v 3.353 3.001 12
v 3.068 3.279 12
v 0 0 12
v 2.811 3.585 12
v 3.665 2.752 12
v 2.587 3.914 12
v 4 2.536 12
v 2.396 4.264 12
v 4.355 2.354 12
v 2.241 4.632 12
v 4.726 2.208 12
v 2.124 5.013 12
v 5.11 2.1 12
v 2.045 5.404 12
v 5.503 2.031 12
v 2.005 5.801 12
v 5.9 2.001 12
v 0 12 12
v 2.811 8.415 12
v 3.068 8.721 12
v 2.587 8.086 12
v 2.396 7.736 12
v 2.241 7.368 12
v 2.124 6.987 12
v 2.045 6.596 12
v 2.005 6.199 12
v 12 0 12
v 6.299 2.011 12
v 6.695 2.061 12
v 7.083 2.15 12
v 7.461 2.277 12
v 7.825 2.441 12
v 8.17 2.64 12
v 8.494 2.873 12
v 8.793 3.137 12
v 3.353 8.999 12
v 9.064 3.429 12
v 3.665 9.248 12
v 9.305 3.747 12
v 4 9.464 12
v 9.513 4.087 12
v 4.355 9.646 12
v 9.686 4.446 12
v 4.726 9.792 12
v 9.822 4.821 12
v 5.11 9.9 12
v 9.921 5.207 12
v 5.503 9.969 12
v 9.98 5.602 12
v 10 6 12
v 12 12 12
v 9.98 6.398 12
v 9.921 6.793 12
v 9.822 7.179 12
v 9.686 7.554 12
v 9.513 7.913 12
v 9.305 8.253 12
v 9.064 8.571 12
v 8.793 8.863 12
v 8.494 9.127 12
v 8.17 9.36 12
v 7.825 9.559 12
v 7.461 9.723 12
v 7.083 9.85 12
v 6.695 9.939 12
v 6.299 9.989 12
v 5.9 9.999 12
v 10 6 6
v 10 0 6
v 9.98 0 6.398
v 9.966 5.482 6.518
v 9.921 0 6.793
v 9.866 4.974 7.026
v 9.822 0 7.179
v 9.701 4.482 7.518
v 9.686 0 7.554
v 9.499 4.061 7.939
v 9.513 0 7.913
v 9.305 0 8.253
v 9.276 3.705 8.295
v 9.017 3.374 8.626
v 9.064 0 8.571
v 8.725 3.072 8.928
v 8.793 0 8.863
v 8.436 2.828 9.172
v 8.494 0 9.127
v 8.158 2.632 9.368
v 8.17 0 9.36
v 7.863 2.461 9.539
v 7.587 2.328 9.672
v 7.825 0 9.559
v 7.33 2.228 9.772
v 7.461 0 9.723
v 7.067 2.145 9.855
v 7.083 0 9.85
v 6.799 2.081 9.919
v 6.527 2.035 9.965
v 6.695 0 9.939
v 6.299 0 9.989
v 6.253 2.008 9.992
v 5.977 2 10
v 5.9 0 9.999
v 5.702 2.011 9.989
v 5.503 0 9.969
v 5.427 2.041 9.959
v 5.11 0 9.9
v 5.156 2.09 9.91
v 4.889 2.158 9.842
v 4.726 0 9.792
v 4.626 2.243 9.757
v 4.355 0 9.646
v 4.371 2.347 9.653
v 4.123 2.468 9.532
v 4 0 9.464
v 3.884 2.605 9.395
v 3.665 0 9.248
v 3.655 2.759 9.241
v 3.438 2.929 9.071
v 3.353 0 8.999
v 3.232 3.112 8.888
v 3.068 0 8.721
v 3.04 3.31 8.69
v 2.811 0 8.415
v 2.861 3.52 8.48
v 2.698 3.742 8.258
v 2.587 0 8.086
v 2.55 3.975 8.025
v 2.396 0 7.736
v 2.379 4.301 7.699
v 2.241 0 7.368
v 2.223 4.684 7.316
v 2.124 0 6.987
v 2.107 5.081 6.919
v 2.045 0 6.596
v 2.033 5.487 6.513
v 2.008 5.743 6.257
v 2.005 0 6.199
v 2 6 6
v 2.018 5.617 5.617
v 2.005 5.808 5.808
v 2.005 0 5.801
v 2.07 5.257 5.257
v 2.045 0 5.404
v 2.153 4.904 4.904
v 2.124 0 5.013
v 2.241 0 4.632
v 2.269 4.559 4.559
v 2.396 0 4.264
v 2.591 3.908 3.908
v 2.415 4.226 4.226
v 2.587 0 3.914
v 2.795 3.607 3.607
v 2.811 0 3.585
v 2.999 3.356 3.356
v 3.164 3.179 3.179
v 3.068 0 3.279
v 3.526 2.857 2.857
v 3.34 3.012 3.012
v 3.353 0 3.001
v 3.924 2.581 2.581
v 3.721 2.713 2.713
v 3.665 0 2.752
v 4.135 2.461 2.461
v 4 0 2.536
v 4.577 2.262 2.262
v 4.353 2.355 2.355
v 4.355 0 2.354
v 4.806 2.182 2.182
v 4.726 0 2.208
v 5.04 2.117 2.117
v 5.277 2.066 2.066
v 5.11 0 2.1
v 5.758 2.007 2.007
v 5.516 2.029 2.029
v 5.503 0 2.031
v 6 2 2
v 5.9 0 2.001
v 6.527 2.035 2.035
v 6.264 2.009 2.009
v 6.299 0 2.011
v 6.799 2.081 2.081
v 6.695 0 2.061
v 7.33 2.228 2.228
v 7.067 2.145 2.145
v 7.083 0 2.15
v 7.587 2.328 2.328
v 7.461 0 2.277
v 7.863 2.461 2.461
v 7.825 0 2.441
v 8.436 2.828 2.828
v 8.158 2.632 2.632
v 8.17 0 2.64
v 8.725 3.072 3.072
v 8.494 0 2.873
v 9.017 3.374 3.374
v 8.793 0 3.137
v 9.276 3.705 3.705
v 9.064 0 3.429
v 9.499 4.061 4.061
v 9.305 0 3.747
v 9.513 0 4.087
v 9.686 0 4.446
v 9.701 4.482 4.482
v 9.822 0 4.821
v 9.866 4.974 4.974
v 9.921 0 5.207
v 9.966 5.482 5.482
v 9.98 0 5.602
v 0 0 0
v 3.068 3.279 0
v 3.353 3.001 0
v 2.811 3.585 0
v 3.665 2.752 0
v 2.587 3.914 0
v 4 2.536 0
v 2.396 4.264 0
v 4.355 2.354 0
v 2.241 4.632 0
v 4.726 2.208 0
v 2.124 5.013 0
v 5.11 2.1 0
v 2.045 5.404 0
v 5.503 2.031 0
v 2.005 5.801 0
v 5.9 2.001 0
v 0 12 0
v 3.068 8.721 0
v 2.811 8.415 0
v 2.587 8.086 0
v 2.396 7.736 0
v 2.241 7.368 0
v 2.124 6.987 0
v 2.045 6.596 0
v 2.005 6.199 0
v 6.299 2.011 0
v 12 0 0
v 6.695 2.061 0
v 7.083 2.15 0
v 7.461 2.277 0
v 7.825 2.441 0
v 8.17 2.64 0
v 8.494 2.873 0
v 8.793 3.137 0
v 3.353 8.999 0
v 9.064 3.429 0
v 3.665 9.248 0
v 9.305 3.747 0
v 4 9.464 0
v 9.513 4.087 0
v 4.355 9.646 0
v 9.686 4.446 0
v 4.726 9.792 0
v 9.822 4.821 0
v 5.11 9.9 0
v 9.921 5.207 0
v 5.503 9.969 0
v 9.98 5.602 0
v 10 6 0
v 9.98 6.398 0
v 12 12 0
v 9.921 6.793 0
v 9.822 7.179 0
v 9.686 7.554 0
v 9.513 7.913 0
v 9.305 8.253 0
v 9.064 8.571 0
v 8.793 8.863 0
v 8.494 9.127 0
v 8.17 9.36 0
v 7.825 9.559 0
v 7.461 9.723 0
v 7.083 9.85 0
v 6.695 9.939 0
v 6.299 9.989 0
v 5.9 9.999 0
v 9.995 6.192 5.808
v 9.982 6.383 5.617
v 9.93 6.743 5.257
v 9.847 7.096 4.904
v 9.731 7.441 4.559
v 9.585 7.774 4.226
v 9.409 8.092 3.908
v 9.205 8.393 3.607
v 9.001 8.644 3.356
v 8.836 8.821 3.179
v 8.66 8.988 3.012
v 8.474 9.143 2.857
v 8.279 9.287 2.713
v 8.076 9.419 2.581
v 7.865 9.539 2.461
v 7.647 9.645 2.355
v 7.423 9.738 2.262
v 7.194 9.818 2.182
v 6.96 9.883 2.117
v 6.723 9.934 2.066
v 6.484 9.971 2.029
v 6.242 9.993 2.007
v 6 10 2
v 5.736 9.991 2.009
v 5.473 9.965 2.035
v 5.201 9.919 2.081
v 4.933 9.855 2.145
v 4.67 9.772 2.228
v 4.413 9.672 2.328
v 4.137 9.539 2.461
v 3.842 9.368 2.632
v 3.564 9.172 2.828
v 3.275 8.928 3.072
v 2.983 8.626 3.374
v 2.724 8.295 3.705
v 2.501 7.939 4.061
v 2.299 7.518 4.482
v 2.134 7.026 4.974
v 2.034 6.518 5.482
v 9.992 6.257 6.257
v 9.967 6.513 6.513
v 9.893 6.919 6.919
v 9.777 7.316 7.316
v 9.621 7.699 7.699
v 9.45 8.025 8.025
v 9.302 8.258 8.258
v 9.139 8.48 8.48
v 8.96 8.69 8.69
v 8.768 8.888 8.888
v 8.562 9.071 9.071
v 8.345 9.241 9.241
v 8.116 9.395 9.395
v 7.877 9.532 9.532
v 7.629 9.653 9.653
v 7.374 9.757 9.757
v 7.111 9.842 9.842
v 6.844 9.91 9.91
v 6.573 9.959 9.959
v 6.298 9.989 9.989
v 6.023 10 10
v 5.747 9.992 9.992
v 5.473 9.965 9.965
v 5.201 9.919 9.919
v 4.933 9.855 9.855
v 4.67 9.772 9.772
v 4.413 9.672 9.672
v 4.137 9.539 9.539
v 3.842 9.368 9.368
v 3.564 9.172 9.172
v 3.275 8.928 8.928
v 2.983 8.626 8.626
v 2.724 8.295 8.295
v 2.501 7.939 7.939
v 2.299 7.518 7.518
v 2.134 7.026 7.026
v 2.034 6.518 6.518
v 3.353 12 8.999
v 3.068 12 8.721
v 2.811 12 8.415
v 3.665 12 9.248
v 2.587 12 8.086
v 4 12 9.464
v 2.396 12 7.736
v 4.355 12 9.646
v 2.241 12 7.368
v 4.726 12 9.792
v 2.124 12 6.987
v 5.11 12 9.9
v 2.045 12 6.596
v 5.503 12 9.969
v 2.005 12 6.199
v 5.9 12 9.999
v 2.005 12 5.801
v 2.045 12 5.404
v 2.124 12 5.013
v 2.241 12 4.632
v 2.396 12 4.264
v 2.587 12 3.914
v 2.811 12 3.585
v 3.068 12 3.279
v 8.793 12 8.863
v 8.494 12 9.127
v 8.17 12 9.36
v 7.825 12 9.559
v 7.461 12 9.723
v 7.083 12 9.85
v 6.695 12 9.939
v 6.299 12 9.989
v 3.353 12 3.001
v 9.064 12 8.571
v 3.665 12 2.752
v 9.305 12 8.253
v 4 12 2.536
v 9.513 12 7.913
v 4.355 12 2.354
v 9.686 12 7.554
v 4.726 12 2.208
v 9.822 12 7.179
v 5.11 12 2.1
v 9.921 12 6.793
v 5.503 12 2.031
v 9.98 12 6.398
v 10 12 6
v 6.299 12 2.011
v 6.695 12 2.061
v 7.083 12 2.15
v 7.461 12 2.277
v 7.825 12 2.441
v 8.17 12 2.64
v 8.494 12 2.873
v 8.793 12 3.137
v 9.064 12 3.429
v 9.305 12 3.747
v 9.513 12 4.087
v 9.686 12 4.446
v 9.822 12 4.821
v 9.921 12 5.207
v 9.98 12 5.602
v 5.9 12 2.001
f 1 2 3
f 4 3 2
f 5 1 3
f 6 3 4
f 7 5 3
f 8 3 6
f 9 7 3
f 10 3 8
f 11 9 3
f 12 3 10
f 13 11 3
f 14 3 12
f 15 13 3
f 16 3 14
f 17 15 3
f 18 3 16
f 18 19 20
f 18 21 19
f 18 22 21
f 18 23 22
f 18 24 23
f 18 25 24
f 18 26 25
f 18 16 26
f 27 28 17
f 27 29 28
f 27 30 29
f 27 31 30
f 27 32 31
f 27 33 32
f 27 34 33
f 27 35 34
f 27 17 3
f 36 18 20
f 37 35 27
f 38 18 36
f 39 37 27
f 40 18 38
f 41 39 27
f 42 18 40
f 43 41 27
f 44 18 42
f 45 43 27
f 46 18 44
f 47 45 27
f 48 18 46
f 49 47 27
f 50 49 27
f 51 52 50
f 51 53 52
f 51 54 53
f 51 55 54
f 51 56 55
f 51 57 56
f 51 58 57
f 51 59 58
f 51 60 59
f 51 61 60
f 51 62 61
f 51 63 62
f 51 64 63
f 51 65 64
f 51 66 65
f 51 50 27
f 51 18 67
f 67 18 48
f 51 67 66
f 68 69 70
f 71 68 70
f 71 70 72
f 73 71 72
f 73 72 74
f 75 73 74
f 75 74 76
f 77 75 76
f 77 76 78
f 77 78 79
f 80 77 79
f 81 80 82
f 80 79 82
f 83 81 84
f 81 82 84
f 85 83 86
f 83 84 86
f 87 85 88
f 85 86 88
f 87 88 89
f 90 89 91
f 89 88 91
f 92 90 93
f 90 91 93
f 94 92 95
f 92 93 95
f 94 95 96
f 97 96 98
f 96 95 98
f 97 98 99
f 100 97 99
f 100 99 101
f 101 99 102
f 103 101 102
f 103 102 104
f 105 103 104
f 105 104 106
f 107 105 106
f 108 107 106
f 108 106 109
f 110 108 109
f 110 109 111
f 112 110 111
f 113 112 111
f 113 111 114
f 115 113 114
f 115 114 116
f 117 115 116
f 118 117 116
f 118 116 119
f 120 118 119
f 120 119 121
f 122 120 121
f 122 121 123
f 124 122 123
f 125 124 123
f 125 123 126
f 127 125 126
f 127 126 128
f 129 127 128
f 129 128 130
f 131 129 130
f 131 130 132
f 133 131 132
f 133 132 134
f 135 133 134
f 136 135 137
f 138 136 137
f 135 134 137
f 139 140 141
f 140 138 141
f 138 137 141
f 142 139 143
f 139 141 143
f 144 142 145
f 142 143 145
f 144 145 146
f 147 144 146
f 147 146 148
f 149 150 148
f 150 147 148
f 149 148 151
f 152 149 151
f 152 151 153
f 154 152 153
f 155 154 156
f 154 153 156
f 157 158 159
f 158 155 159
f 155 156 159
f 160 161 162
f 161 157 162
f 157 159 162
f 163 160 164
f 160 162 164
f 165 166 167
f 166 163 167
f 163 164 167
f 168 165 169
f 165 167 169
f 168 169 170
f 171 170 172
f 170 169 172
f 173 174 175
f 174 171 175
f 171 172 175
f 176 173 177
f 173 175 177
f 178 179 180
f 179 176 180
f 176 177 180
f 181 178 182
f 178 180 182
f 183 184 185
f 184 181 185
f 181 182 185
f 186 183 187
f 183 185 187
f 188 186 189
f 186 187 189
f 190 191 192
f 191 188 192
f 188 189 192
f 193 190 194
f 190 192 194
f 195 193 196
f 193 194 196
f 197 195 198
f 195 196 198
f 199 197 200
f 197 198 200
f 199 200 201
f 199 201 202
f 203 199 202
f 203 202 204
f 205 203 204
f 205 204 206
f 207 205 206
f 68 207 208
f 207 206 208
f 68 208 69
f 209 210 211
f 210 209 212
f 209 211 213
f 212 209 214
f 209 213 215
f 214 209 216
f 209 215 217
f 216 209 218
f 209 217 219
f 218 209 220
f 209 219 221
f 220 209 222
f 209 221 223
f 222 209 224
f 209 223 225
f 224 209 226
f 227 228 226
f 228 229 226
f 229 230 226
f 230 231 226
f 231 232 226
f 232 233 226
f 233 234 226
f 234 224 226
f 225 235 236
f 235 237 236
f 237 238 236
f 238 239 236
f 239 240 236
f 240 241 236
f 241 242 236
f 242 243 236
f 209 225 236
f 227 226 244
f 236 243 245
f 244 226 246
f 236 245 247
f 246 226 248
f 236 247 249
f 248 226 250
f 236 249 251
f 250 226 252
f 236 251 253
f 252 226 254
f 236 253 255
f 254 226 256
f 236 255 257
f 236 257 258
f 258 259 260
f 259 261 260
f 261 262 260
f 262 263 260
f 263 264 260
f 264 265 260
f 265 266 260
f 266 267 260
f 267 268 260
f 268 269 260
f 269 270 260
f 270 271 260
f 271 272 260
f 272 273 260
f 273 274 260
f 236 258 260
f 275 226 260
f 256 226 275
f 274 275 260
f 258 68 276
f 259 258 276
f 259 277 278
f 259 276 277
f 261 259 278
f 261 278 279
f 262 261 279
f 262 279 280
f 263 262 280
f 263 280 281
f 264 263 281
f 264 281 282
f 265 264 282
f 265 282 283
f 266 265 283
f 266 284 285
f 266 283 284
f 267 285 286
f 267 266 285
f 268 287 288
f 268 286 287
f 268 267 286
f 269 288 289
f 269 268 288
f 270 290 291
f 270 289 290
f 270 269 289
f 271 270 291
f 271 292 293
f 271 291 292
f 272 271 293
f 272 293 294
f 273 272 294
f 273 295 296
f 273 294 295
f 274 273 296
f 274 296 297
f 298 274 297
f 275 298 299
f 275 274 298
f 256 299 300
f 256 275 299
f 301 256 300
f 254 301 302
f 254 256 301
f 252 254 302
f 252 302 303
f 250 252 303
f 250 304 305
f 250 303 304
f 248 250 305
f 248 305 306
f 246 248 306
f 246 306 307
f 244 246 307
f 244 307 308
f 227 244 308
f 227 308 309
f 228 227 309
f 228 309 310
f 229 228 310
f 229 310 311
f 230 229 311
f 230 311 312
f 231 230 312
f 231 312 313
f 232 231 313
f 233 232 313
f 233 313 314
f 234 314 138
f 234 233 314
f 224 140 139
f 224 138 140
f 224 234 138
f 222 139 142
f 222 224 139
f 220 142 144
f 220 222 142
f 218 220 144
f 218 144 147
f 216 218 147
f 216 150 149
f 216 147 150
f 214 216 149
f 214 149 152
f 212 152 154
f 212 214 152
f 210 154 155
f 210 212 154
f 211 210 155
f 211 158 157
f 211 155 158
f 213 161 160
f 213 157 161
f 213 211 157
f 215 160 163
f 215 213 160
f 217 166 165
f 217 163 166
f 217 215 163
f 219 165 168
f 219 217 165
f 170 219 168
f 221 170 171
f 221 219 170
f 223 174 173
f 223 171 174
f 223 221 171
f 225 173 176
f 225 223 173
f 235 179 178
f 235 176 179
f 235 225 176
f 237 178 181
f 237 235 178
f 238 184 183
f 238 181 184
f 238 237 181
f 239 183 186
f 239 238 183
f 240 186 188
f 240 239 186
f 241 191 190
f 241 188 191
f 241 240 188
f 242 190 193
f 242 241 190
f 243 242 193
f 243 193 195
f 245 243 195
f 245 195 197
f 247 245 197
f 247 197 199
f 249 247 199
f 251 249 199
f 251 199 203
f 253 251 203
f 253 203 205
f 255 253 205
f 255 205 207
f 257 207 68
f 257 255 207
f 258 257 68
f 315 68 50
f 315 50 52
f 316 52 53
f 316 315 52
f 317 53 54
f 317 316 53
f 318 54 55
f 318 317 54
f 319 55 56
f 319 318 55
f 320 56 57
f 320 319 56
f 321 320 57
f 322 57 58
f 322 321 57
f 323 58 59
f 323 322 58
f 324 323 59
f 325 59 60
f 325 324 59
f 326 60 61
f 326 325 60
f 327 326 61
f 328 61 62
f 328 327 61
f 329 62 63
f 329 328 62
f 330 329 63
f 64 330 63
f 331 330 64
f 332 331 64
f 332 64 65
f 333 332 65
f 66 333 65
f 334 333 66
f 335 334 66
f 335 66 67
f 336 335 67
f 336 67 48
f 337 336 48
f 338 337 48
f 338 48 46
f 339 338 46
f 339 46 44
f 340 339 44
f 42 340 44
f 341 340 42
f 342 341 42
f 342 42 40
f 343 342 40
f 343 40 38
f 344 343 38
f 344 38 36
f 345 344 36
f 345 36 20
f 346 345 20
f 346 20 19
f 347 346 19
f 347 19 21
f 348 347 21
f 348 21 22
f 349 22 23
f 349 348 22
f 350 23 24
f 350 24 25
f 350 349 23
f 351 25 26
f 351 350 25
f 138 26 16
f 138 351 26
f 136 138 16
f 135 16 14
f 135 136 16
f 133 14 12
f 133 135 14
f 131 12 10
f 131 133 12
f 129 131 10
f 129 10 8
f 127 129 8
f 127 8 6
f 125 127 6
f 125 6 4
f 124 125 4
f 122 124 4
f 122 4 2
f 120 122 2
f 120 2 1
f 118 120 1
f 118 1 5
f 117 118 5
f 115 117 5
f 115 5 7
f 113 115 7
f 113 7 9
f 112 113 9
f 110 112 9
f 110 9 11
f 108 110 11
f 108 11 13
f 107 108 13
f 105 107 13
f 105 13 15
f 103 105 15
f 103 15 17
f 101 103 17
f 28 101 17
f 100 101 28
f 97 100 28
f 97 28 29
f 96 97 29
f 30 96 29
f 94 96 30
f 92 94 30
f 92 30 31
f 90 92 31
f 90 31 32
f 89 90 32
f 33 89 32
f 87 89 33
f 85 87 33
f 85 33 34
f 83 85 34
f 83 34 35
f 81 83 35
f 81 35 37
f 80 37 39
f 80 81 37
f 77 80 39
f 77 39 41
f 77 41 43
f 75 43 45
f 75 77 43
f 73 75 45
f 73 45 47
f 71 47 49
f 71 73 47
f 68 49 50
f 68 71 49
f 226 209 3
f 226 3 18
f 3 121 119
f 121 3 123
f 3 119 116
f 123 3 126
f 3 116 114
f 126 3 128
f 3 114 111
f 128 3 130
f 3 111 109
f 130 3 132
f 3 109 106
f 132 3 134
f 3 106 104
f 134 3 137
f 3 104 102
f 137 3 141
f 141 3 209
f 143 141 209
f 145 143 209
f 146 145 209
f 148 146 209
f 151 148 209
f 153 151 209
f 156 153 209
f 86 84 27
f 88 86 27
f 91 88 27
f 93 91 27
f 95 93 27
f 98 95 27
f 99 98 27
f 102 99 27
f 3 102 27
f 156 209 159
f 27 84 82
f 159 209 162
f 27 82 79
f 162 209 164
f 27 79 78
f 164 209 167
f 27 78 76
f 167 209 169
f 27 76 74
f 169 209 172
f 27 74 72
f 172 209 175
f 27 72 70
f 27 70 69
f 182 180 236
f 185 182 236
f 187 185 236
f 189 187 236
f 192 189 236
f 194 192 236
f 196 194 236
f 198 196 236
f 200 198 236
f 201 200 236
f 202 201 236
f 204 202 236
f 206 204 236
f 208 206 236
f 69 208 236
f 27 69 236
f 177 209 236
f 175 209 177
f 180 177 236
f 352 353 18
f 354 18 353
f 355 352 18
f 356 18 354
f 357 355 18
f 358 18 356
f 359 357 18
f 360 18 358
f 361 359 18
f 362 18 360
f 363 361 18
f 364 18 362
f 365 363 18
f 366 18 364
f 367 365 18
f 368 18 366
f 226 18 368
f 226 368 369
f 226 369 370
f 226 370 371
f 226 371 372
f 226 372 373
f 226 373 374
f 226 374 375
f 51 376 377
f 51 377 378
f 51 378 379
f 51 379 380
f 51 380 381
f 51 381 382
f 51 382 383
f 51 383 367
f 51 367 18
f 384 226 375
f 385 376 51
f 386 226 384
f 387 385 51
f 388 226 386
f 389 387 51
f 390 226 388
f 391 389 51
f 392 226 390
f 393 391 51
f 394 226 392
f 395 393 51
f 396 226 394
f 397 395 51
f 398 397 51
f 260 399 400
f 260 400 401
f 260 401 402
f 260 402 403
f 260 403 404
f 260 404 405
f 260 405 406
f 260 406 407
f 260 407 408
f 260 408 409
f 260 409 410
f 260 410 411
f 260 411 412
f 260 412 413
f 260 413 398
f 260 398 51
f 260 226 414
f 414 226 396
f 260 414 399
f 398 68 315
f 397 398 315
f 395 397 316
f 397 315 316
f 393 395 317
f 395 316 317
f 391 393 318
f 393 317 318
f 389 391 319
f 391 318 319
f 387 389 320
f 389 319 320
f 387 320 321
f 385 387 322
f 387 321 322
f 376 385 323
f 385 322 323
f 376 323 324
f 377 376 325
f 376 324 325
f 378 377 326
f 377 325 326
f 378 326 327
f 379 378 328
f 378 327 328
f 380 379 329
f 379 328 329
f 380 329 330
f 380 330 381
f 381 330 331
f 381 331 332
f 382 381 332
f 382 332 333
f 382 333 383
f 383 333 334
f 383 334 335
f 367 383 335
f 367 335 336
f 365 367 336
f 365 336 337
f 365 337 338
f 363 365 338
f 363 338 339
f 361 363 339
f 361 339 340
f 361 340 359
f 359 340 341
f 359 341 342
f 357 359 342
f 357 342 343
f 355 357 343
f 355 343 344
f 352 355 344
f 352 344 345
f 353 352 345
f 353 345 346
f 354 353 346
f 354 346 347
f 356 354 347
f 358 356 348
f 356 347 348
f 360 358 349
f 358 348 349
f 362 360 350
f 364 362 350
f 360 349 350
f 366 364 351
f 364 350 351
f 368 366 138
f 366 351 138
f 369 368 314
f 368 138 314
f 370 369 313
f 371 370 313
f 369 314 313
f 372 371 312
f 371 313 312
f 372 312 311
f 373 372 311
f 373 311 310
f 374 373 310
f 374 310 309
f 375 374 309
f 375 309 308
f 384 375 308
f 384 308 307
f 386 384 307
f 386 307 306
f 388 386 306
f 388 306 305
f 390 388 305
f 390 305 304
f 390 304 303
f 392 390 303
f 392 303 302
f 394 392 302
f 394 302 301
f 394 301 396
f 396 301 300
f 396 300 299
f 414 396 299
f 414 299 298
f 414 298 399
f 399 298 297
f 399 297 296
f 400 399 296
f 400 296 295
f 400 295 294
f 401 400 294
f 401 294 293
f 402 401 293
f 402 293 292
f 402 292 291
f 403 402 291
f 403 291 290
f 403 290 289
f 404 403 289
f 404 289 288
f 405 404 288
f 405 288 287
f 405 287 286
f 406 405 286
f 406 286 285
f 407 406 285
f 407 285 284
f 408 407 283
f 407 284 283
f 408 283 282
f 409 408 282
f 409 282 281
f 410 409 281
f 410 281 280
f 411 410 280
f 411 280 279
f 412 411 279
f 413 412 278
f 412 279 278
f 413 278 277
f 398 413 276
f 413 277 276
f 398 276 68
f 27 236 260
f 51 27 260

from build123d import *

# Parameters (mm, degrees)
SKETCH_W     = 12
SKETCH_H     = 12
SKETCH_R     = 4
PAD_DEPTH    = 12
SKETCH001_R  = 4
POCKET_DEPTH = 12.001


with BuildPart() as part:
    # Sketch → Pad (new body)
    with BuildSketch(Plane.XY):
        with Locations((6, 6)):
            Rectangle(SKETCH_W, SKETCH_H)
        with Locations((6, 6)):
            Circle(SKETCH_R, mode=Mode.SUBTRACT)
    extrude(amount=PAD_DEPTH)

    # Sketch001 (on Face1 of Pad) → Pocket (cut, through all)
    with BuildSketch(Plane.XZ):
        with Locations((6, 6)):
            Circle(SKETCH001_R)
    extrude(amount=-POCKET_DEPTH, mode=Mode.SUBTRACT)


solid = part.part
